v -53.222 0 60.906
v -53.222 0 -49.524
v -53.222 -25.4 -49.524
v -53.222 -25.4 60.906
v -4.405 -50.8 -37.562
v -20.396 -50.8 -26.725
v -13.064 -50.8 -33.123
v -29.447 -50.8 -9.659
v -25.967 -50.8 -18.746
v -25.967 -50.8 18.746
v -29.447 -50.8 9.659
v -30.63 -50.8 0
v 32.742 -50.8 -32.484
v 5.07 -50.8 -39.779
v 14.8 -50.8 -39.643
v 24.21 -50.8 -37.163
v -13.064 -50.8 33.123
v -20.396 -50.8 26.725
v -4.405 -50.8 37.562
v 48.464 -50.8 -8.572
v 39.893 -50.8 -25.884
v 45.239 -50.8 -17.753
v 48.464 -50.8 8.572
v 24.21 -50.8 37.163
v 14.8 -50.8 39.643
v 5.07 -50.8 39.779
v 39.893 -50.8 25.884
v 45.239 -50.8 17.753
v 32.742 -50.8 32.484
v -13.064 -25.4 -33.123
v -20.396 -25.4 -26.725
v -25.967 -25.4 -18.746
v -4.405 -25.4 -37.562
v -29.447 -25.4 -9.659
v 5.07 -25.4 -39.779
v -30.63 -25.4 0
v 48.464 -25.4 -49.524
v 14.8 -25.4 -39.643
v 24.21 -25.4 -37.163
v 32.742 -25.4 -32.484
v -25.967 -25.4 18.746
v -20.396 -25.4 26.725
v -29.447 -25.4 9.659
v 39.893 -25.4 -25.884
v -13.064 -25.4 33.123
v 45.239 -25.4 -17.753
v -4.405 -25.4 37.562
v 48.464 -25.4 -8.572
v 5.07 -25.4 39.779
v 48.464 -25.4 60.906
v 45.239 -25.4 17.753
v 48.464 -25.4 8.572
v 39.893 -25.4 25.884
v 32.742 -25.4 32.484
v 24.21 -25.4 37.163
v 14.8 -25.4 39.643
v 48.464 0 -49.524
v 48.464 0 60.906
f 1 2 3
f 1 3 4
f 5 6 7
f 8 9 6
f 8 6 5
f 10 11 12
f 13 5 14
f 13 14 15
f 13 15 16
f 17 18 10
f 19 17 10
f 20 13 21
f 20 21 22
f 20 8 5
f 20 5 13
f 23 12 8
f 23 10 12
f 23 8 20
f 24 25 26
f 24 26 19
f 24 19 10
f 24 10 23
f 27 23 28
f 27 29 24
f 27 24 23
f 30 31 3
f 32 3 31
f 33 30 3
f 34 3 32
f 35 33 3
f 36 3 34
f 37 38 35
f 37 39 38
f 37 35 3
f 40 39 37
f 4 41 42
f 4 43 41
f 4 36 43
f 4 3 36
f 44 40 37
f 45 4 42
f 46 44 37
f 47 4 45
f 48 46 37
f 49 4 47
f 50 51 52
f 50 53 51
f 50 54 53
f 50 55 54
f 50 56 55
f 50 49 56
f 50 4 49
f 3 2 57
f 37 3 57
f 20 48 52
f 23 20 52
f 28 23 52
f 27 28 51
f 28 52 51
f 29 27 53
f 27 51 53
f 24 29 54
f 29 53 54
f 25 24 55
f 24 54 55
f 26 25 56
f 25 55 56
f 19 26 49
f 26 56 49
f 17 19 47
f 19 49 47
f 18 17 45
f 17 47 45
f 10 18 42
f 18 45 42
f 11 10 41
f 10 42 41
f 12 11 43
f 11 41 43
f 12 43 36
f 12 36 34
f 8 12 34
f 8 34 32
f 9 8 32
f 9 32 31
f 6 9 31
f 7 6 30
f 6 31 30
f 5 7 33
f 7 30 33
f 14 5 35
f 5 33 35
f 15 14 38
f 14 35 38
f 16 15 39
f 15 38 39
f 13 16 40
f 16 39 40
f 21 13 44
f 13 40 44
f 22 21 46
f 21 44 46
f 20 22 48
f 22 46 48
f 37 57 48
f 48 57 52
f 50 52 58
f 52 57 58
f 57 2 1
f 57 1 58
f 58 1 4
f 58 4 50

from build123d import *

# Parameters (mm, degrees)
F0_W     = 101.685505
F0_H     = 110.430561
F1_DEPTH = 25.4
F3_DEPTH = 25.4


with BuildPart() as f1:
    # F0 (on Front) → F1 (new body)
    with BuildSketch(Plane.XZ):
        with Locations((-2.378846, 5.691071)):
            Rectangle(F0_W, F0_H)
    extrude(amount=F1_DEPTH)

    # F2 (on face) → F3 (join)
    with BuildSketch(Plane.XZ.offset(25.4)):
        with BuildLine():
            Line((48.463907, -8.572468), (48.463907, 8.572468))
            ThreePointArc((48.463907, 8.572468), (-30.630272, 0), (48.463907, -8.572468))
        make_face()
    extrude(amount=F3_DEPTH)


solid = f1.part
